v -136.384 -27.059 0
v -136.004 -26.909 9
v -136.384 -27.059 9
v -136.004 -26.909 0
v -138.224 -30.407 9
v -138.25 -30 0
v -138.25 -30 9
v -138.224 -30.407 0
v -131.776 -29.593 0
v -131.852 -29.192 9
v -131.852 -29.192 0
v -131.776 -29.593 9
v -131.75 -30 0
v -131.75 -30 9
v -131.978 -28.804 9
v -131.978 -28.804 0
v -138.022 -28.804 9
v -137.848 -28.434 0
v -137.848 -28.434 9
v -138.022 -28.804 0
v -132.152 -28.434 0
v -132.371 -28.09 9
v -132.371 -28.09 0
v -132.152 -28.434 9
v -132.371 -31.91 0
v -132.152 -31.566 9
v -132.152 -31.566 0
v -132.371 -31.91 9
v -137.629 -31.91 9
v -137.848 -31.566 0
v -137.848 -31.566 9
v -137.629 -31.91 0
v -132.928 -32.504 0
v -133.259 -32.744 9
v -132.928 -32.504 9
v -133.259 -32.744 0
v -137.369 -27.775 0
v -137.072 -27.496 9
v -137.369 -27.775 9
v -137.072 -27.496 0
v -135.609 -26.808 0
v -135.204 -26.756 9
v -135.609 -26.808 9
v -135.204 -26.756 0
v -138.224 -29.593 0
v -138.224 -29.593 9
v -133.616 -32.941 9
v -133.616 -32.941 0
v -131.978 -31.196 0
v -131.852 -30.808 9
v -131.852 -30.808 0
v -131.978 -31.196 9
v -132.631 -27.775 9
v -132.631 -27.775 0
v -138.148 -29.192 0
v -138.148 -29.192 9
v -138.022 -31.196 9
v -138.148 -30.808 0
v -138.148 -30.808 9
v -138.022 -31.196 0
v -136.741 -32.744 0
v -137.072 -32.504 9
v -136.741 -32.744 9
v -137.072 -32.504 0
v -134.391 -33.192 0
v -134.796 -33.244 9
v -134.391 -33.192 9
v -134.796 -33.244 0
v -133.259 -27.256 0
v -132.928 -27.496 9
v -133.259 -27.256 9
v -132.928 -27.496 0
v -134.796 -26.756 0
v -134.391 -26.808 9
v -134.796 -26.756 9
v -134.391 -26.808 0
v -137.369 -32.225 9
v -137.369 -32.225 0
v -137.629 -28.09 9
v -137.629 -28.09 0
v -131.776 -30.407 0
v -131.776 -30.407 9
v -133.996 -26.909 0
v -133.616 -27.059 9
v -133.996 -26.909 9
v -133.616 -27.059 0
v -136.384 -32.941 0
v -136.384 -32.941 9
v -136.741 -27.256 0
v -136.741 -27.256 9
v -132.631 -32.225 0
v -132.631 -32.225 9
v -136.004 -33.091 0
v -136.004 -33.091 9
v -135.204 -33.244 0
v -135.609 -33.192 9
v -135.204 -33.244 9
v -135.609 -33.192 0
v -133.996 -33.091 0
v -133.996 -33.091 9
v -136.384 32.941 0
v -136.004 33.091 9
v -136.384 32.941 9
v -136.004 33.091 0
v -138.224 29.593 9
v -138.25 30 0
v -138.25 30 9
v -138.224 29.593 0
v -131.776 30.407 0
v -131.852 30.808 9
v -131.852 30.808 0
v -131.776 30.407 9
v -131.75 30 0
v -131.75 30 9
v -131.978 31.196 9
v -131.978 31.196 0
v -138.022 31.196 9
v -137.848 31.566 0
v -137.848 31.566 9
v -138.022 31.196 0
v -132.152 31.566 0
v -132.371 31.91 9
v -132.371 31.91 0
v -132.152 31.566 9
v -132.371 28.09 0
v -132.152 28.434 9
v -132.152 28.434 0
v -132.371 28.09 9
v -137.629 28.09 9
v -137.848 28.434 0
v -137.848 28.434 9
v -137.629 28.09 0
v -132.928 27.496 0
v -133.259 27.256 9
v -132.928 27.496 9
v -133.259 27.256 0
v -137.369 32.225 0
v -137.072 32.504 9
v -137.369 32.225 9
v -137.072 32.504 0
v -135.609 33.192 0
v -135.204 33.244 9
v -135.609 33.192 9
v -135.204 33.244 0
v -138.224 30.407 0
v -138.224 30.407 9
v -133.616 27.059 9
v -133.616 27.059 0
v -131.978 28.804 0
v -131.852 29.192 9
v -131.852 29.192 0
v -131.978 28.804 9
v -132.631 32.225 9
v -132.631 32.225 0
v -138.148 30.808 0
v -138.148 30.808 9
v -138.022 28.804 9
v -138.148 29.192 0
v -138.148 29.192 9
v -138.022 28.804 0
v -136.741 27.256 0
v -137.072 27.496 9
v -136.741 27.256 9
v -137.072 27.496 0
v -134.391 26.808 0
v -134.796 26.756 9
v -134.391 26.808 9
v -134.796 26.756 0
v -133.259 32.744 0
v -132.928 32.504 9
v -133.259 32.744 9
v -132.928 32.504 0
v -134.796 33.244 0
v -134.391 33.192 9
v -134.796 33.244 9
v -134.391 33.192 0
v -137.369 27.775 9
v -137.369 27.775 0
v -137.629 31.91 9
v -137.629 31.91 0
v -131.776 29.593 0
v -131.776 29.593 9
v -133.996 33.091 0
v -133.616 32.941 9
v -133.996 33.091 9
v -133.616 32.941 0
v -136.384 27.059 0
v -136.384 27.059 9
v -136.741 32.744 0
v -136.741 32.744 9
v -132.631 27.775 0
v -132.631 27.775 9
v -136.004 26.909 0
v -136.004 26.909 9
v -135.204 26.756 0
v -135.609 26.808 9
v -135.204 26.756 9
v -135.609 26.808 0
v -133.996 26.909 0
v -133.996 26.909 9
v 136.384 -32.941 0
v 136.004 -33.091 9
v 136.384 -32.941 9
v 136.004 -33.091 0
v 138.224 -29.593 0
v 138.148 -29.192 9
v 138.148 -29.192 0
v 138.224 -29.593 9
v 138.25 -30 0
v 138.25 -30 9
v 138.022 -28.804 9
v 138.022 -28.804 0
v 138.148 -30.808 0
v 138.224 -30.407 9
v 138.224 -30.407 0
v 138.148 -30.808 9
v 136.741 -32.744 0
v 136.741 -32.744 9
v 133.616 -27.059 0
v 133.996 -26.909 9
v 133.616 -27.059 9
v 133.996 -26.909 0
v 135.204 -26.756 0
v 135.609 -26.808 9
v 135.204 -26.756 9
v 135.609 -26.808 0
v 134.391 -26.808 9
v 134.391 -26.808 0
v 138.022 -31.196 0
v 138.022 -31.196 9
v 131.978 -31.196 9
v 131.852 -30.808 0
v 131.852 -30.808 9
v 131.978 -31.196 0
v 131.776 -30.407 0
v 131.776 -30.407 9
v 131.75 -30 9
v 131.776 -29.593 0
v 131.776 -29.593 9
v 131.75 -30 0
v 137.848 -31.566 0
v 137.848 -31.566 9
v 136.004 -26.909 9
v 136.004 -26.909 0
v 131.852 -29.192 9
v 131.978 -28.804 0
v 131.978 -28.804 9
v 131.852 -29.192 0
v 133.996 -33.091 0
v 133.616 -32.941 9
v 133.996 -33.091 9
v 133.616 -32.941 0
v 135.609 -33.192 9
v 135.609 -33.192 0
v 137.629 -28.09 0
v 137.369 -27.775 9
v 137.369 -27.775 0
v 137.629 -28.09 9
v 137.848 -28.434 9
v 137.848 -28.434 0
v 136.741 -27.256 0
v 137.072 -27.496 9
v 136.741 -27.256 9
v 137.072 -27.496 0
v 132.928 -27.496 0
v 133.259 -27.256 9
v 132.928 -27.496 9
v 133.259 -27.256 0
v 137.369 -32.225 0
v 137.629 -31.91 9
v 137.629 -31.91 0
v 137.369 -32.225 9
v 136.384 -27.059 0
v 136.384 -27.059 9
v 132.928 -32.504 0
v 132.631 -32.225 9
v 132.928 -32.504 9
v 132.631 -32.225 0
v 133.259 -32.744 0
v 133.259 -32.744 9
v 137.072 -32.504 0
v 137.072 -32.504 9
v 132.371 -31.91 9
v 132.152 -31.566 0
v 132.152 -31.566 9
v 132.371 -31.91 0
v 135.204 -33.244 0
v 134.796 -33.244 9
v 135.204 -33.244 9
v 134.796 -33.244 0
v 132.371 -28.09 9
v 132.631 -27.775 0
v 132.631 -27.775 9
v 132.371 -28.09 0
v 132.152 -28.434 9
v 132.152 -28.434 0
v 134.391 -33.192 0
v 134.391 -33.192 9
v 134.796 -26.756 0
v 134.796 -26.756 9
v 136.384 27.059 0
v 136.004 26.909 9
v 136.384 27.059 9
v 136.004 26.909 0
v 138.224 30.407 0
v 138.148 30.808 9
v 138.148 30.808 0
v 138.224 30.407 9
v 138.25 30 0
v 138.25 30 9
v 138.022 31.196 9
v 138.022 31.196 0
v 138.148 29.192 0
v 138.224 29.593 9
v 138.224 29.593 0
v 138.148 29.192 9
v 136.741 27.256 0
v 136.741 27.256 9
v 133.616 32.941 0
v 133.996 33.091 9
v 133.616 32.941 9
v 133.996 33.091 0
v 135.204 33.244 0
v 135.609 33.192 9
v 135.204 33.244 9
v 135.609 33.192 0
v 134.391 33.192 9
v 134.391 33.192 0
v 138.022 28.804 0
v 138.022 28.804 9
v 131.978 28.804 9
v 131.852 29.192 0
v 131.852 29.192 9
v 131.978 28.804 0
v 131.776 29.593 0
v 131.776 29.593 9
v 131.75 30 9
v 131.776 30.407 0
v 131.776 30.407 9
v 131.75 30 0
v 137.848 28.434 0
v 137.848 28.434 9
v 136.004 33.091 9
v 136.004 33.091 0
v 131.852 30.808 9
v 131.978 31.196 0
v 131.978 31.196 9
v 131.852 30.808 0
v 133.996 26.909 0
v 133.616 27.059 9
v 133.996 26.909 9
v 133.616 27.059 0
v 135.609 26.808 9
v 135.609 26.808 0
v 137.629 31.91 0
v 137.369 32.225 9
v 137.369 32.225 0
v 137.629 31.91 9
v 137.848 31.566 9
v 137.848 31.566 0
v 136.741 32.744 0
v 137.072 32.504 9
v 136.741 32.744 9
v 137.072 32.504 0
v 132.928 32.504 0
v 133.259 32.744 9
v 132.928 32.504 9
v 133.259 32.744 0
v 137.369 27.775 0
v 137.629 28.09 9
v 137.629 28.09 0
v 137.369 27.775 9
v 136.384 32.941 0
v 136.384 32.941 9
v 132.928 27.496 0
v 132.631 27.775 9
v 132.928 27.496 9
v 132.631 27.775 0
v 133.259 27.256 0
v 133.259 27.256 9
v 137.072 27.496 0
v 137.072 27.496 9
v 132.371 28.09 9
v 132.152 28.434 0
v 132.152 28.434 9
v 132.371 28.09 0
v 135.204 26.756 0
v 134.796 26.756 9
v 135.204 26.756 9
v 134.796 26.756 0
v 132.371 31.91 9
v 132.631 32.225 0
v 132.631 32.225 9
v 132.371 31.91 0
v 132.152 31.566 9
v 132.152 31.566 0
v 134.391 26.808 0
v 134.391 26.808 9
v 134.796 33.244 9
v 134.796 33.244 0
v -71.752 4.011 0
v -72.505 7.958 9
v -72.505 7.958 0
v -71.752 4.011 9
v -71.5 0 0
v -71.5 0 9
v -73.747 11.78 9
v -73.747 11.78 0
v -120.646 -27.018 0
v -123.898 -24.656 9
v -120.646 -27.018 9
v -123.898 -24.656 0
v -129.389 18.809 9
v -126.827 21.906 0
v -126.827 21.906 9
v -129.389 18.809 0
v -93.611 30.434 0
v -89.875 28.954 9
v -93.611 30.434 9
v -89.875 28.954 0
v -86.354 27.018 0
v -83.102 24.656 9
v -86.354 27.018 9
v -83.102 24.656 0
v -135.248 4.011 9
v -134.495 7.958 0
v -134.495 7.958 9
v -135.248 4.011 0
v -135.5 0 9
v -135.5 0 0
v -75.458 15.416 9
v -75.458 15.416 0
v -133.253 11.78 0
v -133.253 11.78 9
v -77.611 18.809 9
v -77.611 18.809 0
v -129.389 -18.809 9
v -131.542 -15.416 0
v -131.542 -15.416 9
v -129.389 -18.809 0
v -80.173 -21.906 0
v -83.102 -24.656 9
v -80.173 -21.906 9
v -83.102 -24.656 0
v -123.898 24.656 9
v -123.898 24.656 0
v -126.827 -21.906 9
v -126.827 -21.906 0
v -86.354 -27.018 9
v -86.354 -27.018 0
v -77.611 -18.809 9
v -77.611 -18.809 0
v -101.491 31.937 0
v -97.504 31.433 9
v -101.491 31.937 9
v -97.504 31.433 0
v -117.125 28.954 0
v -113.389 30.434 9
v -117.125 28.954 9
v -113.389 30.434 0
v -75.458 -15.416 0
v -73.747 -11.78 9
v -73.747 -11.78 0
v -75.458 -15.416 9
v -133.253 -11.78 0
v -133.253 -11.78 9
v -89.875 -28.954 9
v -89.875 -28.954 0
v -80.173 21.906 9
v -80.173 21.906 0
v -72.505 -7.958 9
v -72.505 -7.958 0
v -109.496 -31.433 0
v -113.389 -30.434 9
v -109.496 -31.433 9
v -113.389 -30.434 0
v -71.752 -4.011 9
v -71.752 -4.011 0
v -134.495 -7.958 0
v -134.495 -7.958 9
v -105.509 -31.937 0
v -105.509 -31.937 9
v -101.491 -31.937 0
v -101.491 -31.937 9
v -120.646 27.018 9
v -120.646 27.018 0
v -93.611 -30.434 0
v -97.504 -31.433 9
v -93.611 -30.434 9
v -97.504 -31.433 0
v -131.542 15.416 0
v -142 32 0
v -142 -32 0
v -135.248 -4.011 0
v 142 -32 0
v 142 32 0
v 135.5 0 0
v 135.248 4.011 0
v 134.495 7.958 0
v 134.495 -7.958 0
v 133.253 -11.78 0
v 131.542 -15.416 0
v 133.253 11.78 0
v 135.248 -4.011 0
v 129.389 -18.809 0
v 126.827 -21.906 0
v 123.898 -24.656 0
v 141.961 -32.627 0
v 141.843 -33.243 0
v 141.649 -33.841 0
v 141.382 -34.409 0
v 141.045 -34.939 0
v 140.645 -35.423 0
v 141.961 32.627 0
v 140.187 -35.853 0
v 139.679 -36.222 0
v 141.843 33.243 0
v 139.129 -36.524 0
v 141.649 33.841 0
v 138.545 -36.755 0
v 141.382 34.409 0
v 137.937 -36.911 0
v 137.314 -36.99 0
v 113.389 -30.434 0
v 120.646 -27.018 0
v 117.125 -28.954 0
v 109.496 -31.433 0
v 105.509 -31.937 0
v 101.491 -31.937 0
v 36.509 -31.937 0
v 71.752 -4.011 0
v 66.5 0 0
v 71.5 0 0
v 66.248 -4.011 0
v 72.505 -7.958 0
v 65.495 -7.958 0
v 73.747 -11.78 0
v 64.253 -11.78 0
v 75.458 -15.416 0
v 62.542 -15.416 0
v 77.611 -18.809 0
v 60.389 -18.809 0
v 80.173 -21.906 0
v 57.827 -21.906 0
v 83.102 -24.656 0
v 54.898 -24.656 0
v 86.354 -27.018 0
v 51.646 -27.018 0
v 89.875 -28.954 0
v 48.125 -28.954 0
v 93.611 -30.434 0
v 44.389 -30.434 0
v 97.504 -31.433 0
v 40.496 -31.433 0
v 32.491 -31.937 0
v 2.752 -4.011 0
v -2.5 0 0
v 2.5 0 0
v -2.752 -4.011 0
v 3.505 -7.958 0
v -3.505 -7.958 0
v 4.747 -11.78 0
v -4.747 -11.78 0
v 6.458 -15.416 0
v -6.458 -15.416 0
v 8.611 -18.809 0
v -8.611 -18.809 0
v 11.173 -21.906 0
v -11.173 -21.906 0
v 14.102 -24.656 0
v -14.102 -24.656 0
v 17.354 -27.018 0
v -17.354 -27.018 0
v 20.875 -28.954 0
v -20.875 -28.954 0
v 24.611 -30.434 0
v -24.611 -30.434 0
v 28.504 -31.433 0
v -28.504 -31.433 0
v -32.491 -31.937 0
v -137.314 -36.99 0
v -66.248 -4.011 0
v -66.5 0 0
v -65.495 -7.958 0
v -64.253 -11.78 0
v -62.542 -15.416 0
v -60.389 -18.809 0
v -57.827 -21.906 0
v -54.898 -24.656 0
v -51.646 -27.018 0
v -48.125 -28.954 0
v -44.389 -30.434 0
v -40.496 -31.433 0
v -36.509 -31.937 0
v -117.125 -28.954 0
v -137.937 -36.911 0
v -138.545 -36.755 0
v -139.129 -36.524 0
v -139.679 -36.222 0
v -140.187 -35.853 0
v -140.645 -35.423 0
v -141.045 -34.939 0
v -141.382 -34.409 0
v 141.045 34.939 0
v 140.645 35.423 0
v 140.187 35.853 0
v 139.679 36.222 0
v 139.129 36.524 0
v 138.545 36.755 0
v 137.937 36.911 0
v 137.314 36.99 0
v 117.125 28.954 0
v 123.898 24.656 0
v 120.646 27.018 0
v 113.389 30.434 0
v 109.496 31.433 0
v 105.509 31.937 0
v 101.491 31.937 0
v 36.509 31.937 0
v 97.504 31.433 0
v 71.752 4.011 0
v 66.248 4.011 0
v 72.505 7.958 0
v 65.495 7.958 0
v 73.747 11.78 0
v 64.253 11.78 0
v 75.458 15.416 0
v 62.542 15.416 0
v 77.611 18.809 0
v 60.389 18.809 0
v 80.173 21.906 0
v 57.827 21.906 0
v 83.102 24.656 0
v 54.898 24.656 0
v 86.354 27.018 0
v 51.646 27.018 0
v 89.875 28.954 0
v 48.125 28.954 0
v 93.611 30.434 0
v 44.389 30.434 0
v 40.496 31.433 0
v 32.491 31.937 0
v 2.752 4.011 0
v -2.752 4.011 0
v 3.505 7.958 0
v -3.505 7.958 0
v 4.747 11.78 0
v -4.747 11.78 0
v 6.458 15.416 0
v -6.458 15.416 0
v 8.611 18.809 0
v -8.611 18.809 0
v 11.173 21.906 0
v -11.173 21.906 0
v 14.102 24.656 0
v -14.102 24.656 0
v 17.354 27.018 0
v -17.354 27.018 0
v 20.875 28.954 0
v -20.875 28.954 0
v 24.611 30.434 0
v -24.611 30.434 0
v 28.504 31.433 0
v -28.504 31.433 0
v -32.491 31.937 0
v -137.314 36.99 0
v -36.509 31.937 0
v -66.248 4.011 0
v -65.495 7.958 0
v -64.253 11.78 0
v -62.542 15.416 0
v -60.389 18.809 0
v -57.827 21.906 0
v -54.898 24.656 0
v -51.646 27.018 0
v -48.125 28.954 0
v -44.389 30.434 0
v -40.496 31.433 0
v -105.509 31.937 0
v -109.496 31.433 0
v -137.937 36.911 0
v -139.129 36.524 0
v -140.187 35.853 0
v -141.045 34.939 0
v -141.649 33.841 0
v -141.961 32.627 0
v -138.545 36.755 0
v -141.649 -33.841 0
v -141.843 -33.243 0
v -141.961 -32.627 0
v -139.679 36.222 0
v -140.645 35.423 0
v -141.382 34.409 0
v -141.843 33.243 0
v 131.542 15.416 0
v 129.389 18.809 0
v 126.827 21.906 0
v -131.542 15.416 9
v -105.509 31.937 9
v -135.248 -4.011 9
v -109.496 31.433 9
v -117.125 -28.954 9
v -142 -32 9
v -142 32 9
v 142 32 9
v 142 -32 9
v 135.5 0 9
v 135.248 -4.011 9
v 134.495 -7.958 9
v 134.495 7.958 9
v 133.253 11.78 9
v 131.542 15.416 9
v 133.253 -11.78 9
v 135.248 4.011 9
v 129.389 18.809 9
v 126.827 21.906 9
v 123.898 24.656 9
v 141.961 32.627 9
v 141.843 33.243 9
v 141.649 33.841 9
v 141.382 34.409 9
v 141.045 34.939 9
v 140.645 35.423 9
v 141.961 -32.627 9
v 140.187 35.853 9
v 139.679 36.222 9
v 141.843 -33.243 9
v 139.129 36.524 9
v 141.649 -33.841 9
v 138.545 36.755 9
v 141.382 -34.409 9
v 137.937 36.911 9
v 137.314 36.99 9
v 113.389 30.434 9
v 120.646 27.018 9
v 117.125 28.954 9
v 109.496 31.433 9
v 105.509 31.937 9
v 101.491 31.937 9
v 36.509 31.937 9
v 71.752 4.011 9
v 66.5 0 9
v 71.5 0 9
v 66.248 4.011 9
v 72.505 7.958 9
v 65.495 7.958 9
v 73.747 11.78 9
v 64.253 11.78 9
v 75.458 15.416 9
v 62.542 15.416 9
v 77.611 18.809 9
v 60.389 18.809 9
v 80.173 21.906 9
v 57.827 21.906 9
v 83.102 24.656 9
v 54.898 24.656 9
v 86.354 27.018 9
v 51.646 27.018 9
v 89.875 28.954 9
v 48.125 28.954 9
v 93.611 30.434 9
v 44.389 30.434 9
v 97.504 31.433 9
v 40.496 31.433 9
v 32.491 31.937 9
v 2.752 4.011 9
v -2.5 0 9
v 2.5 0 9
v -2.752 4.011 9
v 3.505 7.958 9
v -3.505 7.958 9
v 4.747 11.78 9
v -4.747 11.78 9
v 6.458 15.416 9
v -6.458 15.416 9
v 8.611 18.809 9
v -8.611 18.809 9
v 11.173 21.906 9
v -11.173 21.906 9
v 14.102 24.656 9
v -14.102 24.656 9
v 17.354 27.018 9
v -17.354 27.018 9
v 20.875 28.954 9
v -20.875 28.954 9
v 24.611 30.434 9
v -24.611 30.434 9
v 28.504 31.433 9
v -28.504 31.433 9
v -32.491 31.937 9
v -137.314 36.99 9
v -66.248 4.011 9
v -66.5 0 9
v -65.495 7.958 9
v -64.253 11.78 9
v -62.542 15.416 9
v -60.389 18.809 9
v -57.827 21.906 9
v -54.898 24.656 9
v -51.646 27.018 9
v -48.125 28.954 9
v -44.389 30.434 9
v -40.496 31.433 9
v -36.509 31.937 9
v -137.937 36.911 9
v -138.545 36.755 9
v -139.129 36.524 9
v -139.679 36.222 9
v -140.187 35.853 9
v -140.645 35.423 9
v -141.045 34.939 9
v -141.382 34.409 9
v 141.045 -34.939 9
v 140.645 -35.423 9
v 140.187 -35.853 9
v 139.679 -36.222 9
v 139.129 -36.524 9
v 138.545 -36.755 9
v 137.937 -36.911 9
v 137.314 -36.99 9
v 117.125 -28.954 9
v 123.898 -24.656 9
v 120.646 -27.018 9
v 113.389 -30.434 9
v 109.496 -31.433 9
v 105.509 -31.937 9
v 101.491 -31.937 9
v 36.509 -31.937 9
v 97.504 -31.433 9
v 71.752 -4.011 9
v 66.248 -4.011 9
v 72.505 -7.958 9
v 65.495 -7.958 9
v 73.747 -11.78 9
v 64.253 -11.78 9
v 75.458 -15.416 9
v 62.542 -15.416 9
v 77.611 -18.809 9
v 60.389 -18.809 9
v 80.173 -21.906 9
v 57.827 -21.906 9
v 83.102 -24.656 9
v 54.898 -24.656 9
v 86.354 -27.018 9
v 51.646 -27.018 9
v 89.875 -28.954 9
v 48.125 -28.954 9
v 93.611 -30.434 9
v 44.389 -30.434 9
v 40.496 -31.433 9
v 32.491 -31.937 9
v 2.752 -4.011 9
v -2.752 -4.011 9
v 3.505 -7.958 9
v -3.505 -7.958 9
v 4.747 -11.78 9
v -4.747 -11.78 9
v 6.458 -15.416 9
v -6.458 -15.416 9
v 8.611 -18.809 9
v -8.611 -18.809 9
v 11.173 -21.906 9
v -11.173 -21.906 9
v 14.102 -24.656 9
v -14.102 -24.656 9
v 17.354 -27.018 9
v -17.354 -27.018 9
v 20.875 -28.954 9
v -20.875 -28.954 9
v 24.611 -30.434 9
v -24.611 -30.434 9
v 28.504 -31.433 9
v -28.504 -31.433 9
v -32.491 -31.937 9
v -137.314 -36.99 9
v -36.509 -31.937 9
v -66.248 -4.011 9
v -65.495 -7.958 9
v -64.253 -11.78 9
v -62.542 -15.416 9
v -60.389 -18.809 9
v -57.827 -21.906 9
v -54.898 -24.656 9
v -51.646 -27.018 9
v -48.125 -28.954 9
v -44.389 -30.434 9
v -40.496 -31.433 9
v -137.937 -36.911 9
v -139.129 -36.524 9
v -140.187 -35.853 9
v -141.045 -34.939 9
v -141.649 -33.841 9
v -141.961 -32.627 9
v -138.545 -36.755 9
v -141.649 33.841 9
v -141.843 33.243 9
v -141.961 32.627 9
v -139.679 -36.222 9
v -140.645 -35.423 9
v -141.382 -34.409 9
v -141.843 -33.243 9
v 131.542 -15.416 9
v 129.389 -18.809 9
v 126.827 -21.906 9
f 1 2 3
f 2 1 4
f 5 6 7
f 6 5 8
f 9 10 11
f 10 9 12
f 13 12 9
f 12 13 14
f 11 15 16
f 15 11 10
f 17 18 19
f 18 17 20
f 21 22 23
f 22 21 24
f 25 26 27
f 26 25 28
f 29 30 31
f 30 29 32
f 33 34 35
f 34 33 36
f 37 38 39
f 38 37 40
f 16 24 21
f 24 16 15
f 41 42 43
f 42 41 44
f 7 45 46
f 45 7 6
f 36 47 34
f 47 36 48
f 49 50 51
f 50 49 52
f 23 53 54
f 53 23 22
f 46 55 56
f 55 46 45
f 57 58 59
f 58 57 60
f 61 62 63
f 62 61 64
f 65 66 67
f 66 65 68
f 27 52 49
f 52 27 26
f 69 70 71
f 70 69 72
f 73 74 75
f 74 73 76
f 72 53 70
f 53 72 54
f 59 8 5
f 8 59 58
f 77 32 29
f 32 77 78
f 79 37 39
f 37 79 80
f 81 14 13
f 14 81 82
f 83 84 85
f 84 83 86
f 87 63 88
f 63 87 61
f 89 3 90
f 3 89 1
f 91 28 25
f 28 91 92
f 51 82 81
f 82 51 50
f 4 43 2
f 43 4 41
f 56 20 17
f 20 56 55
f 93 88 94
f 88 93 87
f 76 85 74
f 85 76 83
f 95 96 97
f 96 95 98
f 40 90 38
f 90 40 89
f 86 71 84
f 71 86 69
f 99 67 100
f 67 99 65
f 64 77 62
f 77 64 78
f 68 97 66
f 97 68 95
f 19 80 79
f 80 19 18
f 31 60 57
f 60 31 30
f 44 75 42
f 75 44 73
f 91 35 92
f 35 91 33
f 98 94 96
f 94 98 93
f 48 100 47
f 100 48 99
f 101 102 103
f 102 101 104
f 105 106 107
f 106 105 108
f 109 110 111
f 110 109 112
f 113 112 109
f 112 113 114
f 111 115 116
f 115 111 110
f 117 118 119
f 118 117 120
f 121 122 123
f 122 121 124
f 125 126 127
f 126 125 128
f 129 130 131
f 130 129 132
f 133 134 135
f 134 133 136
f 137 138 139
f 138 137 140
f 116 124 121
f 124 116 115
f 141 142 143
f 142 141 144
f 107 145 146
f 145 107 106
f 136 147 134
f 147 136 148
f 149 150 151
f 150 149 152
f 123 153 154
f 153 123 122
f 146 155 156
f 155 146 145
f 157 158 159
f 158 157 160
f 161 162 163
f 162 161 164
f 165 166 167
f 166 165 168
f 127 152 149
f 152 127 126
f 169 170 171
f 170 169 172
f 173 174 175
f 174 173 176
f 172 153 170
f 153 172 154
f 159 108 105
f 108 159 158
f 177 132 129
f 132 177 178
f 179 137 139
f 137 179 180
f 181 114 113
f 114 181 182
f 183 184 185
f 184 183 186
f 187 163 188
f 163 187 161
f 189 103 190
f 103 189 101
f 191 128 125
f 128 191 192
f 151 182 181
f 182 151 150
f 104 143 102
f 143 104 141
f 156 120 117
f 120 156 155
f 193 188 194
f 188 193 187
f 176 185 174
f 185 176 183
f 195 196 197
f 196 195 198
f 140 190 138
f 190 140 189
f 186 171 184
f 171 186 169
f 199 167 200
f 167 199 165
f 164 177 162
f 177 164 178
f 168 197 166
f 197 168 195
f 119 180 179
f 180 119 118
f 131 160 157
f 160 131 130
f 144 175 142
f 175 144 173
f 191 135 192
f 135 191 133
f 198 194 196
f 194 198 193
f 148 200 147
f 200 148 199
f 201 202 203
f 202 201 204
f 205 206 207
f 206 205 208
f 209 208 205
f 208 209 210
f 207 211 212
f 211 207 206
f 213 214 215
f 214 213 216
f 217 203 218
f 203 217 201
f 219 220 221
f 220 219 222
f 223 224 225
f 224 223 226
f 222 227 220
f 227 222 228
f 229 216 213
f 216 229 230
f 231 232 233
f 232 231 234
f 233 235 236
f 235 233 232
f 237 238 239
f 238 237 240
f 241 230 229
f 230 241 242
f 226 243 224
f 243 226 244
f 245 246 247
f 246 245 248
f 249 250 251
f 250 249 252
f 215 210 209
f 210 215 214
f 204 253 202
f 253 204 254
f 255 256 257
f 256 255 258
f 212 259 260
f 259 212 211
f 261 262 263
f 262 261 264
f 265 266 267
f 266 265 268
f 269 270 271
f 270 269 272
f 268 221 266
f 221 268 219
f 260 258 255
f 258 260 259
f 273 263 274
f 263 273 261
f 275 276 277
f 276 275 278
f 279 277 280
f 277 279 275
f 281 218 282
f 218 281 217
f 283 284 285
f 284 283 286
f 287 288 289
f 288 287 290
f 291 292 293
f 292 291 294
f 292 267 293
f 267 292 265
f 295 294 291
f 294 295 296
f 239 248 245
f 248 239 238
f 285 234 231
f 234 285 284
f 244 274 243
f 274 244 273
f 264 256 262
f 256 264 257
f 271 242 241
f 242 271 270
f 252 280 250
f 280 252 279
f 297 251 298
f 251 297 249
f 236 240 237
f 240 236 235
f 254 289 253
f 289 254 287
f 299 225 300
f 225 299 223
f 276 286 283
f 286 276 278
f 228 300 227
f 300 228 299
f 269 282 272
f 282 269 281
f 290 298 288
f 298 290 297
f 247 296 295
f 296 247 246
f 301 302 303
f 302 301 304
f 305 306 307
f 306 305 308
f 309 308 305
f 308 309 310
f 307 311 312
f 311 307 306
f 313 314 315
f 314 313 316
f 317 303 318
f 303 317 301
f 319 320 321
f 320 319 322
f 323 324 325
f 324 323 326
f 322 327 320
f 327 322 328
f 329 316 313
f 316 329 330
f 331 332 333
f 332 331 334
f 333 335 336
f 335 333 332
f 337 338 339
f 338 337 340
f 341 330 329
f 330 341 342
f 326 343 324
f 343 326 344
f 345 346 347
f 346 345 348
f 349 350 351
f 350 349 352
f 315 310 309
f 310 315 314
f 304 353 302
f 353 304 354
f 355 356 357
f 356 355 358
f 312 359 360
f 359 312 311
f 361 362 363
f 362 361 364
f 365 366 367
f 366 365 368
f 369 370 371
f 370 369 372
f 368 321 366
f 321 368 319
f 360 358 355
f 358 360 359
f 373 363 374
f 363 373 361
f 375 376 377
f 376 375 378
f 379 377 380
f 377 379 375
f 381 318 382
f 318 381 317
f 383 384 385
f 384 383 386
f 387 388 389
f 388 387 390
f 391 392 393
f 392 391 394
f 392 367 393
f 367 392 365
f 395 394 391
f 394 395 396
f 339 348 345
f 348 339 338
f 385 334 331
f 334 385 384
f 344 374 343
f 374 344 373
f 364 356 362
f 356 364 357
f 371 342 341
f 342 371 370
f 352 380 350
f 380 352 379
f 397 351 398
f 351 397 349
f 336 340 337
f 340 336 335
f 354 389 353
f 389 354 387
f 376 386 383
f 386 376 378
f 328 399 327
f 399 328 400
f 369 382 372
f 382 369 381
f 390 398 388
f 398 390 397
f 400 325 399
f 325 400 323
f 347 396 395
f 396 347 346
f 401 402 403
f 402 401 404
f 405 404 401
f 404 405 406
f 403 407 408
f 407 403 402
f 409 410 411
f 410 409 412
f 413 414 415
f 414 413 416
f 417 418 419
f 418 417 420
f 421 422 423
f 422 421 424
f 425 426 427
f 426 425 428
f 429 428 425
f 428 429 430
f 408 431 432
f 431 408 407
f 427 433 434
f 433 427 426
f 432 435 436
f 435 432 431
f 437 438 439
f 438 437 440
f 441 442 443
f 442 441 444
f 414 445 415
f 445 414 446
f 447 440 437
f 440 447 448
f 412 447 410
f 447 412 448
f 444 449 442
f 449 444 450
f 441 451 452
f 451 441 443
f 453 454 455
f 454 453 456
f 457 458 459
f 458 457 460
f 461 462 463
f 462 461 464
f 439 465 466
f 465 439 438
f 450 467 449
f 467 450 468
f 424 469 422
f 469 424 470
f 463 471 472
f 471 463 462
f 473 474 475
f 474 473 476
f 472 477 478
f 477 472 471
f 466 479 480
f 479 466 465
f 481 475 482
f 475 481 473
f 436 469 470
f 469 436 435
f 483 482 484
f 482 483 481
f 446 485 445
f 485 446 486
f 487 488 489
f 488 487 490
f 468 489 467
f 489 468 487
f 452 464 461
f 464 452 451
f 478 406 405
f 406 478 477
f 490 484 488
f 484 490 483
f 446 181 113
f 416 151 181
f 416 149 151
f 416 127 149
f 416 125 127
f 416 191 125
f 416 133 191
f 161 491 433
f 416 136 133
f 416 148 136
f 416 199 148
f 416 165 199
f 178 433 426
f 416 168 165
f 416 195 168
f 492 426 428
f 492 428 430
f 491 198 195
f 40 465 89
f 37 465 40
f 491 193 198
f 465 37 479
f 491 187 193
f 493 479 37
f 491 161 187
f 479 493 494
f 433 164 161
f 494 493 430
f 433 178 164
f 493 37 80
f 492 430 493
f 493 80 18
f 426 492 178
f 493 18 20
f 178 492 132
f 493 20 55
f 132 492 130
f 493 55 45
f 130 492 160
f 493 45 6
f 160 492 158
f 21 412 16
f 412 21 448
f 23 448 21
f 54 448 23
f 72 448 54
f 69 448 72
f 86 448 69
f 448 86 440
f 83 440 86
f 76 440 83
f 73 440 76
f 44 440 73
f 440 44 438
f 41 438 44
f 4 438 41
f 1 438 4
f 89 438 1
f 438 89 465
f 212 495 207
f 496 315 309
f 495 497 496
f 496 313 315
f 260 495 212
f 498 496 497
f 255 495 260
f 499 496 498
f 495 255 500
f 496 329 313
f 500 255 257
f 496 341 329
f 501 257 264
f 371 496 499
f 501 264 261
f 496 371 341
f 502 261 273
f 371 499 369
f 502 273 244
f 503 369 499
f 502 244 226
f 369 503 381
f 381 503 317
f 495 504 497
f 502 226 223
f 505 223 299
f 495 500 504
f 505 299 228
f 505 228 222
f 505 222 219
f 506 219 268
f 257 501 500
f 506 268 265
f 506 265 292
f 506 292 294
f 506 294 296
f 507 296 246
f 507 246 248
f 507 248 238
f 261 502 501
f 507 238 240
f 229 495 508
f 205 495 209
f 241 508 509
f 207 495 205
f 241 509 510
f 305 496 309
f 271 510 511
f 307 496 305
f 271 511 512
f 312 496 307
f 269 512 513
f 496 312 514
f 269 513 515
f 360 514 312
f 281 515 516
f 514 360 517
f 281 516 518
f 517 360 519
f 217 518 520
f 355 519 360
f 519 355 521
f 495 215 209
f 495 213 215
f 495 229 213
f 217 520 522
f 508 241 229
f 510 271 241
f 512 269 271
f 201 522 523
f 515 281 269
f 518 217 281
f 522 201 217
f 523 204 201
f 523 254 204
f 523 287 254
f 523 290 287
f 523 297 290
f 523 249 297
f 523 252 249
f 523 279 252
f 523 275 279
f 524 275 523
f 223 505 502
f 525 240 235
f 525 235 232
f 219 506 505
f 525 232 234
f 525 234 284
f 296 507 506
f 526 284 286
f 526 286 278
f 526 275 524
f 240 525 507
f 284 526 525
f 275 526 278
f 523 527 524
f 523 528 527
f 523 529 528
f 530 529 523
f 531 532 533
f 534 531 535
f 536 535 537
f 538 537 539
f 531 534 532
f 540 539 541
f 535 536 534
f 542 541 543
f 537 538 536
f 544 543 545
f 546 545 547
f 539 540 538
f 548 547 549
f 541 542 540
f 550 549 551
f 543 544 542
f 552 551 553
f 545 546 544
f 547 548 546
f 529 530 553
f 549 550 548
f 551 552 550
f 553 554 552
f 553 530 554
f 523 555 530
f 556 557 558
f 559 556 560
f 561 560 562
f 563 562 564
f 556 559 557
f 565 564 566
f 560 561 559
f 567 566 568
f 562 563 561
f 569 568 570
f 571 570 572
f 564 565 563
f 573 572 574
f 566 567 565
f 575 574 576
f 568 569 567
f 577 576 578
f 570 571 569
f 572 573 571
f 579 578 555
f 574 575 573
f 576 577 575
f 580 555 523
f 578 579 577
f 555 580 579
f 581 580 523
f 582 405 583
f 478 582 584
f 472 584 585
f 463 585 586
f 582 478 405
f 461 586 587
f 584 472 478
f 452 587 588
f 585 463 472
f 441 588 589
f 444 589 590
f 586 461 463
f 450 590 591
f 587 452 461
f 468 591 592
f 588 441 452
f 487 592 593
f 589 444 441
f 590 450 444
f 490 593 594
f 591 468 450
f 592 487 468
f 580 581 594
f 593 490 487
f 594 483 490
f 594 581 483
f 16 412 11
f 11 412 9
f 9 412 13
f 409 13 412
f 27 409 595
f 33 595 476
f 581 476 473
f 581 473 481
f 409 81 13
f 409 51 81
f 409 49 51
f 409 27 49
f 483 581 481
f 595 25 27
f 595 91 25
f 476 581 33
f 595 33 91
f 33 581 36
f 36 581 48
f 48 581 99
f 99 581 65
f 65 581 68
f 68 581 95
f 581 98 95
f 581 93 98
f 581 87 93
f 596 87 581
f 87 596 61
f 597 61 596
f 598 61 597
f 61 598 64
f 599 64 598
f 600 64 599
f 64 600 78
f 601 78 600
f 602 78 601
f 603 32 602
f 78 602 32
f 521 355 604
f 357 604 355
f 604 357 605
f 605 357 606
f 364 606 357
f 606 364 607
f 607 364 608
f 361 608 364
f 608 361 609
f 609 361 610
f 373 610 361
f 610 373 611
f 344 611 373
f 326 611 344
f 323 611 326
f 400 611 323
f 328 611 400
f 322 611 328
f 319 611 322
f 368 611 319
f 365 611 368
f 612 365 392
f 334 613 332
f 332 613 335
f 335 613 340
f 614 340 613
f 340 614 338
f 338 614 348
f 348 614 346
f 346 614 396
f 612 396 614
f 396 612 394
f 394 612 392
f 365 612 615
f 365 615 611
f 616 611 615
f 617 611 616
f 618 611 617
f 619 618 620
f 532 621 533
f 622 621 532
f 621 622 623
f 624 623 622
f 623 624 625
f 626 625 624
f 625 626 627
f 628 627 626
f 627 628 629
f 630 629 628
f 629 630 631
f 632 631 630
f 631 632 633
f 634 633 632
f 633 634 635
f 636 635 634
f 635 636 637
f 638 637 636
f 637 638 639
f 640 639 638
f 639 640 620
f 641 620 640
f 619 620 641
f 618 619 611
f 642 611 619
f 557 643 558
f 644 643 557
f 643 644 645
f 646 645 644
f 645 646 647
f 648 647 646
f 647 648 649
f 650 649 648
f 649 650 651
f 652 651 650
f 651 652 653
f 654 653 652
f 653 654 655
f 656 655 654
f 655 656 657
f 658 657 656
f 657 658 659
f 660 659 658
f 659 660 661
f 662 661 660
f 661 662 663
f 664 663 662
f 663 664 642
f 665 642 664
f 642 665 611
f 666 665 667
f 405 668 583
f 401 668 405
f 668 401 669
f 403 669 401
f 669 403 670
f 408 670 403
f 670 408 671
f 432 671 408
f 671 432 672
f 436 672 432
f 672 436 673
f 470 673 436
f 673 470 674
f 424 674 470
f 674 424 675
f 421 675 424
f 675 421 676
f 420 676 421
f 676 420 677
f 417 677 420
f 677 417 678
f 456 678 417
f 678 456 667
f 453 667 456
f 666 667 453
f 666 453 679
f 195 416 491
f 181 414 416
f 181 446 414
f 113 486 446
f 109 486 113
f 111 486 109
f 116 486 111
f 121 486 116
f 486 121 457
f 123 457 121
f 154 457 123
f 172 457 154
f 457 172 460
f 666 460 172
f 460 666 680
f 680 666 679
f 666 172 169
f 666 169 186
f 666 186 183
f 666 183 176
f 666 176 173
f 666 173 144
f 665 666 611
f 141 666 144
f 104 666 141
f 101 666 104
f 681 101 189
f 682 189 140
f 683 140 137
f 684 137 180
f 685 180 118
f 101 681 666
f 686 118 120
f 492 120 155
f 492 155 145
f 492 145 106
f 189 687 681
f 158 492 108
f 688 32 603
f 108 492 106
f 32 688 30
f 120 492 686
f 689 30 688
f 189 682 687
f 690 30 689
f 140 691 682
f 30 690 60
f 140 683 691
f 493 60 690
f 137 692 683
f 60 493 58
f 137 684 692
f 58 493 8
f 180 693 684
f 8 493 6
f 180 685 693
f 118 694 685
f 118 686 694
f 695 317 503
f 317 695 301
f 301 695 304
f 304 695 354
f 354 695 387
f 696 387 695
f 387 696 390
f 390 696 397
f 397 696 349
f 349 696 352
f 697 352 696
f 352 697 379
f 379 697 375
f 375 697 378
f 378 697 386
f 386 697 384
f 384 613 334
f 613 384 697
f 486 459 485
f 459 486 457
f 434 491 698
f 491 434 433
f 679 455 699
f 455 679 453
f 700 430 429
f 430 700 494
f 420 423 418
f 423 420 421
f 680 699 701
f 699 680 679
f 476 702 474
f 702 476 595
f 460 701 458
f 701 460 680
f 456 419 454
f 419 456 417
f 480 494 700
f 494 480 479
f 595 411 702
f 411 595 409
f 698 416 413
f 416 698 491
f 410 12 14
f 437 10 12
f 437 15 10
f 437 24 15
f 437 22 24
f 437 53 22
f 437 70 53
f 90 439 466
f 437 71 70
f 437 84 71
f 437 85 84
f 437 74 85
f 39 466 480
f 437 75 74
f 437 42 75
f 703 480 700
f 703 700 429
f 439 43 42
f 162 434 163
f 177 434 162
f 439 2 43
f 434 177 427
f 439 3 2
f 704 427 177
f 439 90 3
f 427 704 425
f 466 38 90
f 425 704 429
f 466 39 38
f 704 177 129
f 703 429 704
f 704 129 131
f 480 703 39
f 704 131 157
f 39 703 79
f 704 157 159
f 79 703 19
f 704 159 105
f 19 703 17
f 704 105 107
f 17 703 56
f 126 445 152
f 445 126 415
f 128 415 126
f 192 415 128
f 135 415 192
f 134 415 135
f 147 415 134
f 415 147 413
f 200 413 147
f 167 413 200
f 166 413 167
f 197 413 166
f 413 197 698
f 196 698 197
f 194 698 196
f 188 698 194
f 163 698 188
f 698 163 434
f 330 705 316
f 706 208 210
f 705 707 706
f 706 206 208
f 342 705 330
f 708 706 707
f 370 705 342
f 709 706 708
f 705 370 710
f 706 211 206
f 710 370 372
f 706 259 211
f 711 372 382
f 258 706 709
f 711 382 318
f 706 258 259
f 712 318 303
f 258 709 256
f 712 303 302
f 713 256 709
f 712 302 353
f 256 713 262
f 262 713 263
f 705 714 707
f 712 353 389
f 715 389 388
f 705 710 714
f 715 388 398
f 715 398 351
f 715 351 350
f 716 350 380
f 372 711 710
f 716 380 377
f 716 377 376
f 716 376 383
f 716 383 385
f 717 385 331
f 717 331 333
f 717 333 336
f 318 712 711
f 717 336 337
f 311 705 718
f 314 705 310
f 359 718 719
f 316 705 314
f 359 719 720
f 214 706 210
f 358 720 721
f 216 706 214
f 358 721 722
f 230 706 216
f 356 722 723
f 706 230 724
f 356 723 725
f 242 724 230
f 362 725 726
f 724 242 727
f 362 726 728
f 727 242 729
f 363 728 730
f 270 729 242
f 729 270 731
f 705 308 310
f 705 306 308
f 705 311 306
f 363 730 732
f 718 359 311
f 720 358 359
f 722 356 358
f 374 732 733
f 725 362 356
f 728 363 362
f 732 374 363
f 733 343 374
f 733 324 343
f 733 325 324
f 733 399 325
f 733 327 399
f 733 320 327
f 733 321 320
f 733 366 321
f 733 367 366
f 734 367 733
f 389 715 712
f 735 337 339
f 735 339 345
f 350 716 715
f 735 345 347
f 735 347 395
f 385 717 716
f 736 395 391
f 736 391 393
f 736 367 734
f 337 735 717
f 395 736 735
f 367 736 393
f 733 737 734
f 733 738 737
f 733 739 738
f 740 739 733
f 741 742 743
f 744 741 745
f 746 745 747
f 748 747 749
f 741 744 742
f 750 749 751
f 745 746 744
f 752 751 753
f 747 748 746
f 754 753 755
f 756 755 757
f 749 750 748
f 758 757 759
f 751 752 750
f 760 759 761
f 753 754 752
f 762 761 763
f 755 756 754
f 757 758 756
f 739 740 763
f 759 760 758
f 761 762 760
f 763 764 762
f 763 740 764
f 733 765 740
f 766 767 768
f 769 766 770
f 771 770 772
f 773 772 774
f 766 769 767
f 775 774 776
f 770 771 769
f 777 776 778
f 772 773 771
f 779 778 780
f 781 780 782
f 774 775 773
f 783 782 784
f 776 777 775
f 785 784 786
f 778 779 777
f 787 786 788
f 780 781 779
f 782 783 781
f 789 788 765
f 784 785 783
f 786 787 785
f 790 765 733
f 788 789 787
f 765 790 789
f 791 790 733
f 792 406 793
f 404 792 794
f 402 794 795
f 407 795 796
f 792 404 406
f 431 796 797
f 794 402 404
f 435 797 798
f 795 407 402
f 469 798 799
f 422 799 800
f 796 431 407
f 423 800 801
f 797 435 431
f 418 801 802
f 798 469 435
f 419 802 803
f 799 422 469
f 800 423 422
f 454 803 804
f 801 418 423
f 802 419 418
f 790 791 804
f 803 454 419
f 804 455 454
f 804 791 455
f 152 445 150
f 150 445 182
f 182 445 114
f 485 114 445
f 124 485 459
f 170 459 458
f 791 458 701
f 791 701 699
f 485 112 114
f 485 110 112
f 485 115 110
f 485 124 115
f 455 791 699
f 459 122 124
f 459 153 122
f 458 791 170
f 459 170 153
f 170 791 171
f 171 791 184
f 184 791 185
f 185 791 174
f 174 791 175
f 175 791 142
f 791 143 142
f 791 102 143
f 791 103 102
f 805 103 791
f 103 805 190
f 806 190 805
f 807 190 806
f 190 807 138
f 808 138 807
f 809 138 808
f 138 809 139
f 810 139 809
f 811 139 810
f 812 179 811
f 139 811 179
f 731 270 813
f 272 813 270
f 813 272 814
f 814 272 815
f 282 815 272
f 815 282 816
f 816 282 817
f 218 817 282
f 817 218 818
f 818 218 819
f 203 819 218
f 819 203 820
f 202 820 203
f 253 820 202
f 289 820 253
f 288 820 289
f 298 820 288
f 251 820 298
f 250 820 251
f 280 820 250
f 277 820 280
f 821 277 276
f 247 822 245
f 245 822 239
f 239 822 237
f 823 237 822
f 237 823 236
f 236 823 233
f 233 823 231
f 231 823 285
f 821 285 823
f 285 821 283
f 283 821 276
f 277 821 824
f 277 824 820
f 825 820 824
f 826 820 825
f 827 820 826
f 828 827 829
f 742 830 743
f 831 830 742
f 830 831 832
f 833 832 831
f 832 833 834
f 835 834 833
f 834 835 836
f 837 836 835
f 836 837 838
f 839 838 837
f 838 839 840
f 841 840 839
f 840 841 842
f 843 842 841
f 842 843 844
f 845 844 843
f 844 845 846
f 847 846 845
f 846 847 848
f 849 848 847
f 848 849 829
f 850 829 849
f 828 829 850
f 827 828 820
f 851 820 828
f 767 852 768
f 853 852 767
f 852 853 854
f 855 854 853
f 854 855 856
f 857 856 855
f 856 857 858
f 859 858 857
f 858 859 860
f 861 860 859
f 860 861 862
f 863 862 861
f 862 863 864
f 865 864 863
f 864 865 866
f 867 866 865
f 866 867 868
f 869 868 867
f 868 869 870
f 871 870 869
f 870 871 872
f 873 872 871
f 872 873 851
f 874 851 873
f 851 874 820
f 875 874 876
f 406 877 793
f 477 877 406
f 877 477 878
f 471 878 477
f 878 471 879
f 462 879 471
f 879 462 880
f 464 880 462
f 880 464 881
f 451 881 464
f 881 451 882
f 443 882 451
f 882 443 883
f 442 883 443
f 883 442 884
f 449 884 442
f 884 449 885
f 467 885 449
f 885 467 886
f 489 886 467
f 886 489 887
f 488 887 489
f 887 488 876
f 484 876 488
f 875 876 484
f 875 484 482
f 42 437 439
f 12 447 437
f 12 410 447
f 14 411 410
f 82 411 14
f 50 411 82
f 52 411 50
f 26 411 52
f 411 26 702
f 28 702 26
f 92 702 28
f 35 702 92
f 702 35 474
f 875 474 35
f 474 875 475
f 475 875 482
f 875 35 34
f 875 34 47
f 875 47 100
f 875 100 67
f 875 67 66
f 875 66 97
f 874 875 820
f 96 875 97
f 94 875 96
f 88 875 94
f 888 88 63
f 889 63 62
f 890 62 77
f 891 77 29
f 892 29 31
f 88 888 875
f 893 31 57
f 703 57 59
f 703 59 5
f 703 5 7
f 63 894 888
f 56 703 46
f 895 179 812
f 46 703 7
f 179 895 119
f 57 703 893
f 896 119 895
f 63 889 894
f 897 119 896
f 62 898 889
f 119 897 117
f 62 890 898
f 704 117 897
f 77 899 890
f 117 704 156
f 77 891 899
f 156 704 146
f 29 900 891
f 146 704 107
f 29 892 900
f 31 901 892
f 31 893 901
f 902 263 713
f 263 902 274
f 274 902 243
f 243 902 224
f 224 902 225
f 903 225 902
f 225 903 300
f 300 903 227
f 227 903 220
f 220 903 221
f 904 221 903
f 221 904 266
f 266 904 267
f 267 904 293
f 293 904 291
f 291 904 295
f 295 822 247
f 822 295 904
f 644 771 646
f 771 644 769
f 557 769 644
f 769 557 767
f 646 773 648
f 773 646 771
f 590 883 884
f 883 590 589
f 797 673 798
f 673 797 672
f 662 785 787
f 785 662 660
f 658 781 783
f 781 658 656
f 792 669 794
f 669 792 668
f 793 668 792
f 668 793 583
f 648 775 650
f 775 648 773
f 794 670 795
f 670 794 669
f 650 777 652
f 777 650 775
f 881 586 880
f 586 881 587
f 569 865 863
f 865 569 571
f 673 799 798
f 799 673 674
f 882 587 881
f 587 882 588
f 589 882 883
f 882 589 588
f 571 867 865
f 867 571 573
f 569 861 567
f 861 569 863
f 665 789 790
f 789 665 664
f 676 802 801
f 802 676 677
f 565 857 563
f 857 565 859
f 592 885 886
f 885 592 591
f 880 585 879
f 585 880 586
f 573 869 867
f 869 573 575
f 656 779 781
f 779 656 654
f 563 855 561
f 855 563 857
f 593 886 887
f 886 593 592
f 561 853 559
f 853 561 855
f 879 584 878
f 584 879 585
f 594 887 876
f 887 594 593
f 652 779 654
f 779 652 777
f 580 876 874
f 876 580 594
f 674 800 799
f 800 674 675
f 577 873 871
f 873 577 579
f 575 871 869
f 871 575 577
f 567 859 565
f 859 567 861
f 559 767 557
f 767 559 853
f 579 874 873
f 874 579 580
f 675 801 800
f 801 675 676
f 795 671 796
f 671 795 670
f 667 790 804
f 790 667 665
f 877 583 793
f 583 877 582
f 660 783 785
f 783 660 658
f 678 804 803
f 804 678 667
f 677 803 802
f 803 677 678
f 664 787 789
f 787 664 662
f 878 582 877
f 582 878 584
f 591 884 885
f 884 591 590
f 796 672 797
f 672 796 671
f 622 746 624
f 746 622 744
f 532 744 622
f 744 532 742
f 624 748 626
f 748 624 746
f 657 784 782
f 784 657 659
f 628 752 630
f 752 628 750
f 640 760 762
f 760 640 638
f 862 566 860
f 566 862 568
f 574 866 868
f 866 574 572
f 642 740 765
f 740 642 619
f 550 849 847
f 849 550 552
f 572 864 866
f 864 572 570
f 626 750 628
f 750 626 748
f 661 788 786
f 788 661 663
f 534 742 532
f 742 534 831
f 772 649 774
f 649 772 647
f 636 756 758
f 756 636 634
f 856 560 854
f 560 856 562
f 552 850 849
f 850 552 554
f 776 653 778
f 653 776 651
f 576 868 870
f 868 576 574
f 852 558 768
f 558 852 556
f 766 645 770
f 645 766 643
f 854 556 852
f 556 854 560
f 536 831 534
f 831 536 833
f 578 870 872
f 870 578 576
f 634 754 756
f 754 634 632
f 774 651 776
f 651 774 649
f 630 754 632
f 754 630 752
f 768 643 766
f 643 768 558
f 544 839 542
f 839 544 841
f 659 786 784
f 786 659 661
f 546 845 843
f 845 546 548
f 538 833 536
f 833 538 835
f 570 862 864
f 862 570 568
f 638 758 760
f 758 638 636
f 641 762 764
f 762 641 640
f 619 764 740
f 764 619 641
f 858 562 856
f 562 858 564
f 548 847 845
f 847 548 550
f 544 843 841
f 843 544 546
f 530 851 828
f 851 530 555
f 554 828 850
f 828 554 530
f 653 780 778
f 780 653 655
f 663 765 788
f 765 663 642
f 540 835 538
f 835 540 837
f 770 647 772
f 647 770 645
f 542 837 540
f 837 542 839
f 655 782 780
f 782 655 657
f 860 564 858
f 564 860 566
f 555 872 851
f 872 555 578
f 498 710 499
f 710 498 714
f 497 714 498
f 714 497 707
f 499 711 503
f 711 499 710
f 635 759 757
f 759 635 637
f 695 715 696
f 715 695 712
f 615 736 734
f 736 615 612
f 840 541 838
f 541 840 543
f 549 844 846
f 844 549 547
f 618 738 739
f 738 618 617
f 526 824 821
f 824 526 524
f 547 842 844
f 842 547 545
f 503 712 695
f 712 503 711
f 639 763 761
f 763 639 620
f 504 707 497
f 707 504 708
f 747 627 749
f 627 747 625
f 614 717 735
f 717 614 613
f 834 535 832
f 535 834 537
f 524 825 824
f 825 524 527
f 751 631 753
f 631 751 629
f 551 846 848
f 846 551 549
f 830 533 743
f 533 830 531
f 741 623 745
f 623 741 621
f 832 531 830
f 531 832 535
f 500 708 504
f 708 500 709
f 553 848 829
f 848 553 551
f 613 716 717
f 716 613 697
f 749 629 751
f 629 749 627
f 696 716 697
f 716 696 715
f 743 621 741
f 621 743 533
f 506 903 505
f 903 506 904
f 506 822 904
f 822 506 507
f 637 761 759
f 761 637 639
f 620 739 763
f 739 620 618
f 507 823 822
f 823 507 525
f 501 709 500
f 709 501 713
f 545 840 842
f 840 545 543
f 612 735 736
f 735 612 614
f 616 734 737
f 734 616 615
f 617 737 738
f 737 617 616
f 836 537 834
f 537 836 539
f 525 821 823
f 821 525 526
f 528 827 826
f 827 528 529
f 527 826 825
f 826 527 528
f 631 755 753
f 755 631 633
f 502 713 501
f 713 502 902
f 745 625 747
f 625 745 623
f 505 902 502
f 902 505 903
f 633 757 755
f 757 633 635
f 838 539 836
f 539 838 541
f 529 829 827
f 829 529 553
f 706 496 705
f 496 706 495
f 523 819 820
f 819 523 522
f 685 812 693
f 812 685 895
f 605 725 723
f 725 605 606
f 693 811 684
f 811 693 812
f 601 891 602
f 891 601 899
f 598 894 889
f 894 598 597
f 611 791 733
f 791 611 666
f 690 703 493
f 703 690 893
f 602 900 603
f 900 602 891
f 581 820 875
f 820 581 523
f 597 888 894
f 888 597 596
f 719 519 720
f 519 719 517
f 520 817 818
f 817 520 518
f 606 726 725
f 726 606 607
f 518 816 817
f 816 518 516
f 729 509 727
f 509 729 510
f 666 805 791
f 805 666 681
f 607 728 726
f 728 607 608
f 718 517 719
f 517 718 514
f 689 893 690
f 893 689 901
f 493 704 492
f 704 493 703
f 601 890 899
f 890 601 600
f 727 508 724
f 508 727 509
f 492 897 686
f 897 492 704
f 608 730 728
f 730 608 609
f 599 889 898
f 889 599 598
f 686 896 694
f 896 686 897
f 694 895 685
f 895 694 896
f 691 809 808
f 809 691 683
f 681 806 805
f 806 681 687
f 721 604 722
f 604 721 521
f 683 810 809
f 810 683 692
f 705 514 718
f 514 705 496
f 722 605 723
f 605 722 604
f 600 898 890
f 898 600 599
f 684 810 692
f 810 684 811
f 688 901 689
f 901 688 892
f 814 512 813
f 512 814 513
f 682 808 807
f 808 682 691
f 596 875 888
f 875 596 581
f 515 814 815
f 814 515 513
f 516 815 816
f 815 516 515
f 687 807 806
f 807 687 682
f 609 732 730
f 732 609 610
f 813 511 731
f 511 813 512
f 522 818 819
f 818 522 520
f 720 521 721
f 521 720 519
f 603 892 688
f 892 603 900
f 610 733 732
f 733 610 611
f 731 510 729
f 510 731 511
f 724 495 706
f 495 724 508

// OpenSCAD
$fn = 50;

difference() {
	union() {
		hull() {
			translate(v = [-137.0, 32.0, 0]) {
				cylinder(h = 9, r = 5);
			}
			translate(v = [137.0, 32.0, 0]) {
				cylinder(h = 9, r = 5);
			}
			translate(v = [-137.0, -32.0, 0]) {
				cylinder(h = 9, r = 5);
			}
			translate(v = [137.0, -32.0, 0]) {
				cylinder(h = 9, r = 5);
			}
		}
	}
	union() {
		translate(v = [-135.0, -30.0, -100.0]) {
			cylinder(h = 200, r = 3.25);
		}
		translate(v = [-135.0, 30.0, -100.0]) {
			cylinder(h = 200, r = 3.25);
		}
		translate(v = [135.0, -30.0, -100.0]) {
			cylinder(h = 200, r = 3.25);
		}
		translate(v = [135.0, 30.0, -100.0]) {
			cylinder(h = 200, r = 3.25);
		}
		translate(v = [-135.0, -30.0, -100.0]) {
			cylinder(h = 200, r = 1.8);
		}
		translate(v = [-135.0, 30.0, -100.0]) {
			cylinder(h = 200, r = 1.8);
		}
		translate(v = [135.0, -30.0, -100.0]) {
			cylinder(h = 200, r = 1.8);
		}
		translate(v = [135.0, 30.0, -100.0]) {
			cylinder(h = 200, r = 1.8);
		}
		translate(v = [-103.5, 0, 0.0]) {
			cylinder(h = 9, r = 32.0);
		}
		translate(v = [-34.5, 0, 0.0]) {
			cylinder(h = 9, r = 32.0);
		}
		translate(v = [34.5, 0, 0.0]) {
			cylinder(h = 9, r = 32.0);
		}
		translate(v = [103.5, 0, 0.0]) {
			cylinder(h = 9, r = 32.0);
		}
	}
}
